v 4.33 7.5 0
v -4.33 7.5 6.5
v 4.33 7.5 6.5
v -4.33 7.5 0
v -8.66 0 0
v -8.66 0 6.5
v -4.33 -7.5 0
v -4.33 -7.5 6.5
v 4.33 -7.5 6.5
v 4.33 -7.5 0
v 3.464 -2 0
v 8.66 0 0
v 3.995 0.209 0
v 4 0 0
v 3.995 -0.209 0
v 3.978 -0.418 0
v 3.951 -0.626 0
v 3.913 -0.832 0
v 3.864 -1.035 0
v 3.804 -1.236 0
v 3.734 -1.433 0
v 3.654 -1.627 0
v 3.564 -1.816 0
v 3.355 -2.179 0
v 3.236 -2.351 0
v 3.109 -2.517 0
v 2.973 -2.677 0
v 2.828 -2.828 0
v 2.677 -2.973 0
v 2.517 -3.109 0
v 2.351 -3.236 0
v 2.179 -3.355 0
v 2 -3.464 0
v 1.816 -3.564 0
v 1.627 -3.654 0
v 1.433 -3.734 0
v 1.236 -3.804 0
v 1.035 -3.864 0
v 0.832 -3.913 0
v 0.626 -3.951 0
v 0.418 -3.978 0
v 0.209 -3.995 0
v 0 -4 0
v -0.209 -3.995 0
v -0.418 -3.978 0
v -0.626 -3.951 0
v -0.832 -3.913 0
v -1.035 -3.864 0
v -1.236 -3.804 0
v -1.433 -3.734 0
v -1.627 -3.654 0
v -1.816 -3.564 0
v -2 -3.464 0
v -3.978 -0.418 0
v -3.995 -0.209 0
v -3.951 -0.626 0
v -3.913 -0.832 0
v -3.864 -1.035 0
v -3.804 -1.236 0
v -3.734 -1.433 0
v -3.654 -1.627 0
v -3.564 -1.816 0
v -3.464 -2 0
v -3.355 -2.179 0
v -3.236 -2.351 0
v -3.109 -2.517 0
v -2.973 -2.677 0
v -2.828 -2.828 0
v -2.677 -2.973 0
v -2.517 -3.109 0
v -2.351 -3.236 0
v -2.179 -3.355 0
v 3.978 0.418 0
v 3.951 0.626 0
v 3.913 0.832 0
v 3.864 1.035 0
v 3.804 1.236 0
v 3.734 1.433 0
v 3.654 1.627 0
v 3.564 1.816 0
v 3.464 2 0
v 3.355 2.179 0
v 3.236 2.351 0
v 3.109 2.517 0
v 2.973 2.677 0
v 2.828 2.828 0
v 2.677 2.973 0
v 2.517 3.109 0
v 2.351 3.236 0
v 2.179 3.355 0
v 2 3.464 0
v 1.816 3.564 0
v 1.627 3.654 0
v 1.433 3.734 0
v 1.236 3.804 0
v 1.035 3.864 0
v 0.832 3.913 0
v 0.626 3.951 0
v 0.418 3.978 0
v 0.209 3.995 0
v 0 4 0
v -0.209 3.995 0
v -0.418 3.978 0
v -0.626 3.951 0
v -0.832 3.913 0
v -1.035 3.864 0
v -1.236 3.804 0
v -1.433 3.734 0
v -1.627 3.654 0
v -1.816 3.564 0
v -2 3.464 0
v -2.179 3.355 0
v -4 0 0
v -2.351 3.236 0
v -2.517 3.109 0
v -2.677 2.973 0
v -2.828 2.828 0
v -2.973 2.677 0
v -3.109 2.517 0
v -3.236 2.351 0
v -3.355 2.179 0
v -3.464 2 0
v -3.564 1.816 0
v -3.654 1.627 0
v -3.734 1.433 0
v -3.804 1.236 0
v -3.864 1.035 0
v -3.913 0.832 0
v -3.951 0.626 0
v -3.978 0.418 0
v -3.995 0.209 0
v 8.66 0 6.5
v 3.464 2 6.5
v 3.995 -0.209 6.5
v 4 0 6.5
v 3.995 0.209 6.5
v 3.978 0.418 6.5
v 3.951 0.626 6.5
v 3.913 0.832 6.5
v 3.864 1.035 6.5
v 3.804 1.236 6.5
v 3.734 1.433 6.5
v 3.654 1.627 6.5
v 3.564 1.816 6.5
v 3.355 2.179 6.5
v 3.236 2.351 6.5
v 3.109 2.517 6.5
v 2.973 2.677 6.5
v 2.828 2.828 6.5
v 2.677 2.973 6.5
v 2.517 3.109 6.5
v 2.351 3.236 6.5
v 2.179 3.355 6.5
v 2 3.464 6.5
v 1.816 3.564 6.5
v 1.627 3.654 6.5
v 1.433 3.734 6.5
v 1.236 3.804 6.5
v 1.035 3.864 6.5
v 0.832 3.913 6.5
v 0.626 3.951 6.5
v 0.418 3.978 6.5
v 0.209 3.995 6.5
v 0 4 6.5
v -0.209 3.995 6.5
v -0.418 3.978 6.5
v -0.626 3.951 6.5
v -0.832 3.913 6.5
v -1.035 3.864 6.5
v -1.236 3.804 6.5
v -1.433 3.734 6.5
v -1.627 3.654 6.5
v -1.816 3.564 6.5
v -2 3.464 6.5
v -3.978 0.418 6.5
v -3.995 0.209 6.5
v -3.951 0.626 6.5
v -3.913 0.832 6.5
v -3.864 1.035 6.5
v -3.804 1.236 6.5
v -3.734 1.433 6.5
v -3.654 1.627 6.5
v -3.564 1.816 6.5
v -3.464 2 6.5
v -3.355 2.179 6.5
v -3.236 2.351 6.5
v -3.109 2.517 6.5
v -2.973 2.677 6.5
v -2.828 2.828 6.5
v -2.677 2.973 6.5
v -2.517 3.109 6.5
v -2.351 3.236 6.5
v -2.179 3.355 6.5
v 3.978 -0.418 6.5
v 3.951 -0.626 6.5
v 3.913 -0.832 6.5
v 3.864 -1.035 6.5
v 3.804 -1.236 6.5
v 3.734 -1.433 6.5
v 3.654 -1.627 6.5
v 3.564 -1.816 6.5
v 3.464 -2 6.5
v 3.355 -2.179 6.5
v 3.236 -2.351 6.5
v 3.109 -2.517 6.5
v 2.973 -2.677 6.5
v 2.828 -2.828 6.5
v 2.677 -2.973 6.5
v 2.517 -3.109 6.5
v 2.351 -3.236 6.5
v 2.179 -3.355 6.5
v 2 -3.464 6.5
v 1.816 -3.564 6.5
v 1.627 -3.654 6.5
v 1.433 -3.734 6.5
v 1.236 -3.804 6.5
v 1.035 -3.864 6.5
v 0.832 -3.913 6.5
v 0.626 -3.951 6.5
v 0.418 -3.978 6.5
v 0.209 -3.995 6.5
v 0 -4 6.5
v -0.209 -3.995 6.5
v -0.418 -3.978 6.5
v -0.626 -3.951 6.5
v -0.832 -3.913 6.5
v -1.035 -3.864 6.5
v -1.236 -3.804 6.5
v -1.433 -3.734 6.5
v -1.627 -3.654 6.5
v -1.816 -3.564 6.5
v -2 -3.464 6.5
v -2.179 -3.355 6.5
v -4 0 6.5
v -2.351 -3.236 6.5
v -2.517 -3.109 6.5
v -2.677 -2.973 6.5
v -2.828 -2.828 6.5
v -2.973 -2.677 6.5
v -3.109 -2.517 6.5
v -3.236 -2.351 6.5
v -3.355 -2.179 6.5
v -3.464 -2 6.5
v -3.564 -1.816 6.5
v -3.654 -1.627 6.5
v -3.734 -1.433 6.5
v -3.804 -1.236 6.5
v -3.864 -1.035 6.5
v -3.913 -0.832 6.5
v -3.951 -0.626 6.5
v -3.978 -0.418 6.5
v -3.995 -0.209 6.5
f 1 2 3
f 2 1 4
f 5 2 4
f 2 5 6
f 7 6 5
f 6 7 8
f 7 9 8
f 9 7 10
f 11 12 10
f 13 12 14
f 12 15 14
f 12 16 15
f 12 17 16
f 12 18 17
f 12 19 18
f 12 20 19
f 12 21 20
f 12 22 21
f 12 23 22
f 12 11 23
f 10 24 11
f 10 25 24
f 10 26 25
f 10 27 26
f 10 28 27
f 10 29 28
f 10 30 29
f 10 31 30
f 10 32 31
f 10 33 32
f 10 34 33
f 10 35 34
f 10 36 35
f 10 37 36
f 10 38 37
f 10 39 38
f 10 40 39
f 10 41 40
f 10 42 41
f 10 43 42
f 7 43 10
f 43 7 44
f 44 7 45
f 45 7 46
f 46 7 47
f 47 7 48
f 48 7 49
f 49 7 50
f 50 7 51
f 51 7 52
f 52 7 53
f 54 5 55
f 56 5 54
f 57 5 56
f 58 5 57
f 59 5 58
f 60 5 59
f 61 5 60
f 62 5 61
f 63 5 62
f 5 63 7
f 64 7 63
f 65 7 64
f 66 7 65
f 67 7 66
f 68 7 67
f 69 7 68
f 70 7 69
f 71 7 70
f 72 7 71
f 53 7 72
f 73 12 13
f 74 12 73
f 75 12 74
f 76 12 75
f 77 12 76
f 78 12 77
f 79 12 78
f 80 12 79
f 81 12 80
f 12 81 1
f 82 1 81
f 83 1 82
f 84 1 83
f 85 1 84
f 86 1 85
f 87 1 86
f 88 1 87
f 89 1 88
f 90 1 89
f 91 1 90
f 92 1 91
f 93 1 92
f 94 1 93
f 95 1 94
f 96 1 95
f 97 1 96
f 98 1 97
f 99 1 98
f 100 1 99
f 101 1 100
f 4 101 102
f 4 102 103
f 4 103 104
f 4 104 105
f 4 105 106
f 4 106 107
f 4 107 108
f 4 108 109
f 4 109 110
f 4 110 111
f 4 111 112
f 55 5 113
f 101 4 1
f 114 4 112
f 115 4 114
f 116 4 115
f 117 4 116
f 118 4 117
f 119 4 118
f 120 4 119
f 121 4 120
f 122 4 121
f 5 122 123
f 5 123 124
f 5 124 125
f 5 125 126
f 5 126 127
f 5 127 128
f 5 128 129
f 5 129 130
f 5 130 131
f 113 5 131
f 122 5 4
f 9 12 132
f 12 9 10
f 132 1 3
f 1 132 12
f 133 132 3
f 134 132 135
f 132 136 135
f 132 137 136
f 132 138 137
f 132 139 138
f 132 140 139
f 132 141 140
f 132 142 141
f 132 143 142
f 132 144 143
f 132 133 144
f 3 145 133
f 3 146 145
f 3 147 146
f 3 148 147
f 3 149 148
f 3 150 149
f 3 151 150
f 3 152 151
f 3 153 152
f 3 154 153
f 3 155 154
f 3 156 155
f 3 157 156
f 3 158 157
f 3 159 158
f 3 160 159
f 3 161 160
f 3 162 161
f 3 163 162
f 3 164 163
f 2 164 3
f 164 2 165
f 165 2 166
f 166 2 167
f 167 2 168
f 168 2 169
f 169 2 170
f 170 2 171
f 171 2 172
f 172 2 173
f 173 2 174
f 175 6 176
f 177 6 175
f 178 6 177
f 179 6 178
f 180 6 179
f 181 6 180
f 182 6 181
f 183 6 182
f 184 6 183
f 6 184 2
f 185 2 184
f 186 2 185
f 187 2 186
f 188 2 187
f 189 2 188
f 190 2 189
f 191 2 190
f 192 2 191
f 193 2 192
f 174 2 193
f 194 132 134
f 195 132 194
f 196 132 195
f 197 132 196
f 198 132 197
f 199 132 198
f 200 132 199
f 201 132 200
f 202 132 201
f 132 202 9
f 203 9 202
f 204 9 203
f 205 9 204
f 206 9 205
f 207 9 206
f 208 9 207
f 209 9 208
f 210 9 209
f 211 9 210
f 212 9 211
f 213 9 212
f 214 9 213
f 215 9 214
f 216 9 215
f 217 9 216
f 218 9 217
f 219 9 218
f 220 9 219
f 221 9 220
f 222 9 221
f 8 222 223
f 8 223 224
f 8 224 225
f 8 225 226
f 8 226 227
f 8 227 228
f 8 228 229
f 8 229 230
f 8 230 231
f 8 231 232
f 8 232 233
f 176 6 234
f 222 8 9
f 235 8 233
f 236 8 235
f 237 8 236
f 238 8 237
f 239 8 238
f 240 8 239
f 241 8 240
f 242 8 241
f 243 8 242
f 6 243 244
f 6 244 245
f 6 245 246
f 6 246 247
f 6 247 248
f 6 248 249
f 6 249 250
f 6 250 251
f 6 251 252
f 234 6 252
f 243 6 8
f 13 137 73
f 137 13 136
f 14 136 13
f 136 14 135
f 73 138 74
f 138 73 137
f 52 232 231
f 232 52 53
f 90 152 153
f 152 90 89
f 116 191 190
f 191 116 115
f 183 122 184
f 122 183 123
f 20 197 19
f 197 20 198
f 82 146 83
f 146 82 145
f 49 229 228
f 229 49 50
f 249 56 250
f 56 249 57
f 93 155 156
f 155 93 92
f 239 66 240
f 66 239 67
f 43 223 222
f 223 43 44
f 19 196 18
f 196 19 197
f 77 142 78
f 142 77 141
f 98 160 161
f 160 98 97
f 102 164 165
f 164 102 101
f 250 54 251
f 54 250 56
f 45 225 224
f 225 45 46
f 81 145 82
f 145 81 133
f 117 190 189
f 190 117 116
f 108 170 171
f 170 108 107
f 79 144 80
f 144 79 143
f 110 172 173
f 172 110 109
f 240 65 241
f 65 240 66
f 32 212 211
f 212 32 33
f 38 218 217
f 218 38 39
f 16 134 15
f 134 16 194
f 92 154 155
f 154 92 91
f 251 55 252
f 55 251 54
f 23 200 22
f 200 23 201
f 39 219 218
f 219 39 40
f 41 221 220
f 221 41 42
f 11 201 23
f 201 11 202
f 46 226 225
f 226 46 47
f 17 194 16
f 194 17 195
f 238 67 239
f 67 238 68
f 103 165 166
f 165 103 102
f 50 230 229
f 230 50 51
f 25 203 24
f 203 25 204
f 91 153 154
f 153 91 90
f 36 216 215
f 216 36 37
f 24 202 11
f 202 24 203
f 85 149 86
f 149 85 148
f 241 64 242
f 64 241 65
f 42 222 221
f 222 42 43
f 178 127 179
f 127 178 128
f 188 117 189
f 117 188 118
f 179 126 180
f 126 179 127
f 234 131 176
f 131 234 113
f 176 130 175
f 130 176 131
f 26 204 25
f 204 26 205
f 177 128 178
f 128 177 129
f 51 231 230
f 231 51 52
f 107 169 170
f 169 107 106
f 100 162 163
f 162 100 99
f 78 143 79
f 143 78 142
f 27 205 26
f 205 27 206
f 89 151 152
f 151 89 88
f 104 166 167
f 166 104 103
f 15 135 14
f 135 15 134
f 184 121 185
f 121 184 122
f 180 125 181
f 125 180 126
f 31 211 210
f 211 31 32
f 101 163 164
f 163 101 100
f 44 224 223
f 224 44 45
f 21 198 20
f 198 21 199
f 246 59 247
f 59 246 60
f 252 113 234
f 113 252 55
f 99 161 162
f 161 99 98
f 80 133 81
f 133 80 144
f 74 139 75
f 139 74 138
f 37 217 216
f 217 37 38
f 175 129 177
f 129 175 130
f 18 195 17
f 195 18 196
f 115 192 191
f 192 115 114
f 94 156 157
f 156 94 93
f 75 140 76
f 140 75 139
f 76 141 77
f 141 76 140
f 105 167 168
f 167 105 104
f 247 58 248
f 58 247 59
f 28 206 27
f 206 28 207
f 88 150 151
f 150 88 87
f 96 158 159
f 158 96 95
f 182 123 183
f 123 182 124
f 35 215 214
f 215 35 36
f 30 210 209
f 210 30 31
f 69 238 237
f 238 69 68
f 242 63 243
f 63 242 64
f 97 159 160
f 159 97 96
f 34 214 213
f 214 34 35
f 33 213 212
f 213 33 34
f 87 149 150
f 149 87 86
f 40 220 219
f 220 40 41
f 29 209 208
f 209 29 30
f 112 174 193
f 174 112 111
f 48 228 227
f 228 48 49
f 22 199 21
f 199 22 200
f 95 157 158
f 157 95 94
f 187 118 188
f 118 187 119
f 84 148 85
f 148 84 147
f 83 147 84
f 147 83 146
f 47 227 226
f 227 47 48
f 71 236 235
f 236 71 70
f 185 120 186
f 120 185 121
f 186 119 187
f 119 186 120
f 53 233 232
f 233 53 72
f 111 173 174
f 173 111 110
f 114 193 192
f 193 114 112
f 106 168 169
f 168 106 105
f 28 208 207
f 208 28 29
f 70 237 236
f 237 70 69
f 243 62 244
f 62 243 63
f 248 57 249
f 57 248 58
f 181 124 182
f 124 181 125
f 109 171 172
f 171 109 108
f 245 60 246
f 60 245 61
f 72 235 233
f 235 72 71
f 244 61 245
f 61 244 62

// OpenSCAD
$fn = 120;

screw_d = 8.0;          // clearance hole diameter
across_flats = 15.0;    // hex size across flats
thickness = 6.5;        // nut thickness

module hex_prism_af(af, h) {
    // For a regular hexagon: across_flats = 2 * apothem
    // Circumradius R = apothem / cos(30°) = (af/2) / cos(30°)
    R = (af/2) / cos(30);
    linear_extrude(height = h)
        polygon(points = [ for (i = [0:5]) [ R*cos(60*i), R*sin(60*i) ] ]);
}

difference() {
    hex_prism_af(across_flats, thickness);
    translate([0,0,-0.5])
        cylinder(d = screw_d, h = thickness + 1.0);
}
